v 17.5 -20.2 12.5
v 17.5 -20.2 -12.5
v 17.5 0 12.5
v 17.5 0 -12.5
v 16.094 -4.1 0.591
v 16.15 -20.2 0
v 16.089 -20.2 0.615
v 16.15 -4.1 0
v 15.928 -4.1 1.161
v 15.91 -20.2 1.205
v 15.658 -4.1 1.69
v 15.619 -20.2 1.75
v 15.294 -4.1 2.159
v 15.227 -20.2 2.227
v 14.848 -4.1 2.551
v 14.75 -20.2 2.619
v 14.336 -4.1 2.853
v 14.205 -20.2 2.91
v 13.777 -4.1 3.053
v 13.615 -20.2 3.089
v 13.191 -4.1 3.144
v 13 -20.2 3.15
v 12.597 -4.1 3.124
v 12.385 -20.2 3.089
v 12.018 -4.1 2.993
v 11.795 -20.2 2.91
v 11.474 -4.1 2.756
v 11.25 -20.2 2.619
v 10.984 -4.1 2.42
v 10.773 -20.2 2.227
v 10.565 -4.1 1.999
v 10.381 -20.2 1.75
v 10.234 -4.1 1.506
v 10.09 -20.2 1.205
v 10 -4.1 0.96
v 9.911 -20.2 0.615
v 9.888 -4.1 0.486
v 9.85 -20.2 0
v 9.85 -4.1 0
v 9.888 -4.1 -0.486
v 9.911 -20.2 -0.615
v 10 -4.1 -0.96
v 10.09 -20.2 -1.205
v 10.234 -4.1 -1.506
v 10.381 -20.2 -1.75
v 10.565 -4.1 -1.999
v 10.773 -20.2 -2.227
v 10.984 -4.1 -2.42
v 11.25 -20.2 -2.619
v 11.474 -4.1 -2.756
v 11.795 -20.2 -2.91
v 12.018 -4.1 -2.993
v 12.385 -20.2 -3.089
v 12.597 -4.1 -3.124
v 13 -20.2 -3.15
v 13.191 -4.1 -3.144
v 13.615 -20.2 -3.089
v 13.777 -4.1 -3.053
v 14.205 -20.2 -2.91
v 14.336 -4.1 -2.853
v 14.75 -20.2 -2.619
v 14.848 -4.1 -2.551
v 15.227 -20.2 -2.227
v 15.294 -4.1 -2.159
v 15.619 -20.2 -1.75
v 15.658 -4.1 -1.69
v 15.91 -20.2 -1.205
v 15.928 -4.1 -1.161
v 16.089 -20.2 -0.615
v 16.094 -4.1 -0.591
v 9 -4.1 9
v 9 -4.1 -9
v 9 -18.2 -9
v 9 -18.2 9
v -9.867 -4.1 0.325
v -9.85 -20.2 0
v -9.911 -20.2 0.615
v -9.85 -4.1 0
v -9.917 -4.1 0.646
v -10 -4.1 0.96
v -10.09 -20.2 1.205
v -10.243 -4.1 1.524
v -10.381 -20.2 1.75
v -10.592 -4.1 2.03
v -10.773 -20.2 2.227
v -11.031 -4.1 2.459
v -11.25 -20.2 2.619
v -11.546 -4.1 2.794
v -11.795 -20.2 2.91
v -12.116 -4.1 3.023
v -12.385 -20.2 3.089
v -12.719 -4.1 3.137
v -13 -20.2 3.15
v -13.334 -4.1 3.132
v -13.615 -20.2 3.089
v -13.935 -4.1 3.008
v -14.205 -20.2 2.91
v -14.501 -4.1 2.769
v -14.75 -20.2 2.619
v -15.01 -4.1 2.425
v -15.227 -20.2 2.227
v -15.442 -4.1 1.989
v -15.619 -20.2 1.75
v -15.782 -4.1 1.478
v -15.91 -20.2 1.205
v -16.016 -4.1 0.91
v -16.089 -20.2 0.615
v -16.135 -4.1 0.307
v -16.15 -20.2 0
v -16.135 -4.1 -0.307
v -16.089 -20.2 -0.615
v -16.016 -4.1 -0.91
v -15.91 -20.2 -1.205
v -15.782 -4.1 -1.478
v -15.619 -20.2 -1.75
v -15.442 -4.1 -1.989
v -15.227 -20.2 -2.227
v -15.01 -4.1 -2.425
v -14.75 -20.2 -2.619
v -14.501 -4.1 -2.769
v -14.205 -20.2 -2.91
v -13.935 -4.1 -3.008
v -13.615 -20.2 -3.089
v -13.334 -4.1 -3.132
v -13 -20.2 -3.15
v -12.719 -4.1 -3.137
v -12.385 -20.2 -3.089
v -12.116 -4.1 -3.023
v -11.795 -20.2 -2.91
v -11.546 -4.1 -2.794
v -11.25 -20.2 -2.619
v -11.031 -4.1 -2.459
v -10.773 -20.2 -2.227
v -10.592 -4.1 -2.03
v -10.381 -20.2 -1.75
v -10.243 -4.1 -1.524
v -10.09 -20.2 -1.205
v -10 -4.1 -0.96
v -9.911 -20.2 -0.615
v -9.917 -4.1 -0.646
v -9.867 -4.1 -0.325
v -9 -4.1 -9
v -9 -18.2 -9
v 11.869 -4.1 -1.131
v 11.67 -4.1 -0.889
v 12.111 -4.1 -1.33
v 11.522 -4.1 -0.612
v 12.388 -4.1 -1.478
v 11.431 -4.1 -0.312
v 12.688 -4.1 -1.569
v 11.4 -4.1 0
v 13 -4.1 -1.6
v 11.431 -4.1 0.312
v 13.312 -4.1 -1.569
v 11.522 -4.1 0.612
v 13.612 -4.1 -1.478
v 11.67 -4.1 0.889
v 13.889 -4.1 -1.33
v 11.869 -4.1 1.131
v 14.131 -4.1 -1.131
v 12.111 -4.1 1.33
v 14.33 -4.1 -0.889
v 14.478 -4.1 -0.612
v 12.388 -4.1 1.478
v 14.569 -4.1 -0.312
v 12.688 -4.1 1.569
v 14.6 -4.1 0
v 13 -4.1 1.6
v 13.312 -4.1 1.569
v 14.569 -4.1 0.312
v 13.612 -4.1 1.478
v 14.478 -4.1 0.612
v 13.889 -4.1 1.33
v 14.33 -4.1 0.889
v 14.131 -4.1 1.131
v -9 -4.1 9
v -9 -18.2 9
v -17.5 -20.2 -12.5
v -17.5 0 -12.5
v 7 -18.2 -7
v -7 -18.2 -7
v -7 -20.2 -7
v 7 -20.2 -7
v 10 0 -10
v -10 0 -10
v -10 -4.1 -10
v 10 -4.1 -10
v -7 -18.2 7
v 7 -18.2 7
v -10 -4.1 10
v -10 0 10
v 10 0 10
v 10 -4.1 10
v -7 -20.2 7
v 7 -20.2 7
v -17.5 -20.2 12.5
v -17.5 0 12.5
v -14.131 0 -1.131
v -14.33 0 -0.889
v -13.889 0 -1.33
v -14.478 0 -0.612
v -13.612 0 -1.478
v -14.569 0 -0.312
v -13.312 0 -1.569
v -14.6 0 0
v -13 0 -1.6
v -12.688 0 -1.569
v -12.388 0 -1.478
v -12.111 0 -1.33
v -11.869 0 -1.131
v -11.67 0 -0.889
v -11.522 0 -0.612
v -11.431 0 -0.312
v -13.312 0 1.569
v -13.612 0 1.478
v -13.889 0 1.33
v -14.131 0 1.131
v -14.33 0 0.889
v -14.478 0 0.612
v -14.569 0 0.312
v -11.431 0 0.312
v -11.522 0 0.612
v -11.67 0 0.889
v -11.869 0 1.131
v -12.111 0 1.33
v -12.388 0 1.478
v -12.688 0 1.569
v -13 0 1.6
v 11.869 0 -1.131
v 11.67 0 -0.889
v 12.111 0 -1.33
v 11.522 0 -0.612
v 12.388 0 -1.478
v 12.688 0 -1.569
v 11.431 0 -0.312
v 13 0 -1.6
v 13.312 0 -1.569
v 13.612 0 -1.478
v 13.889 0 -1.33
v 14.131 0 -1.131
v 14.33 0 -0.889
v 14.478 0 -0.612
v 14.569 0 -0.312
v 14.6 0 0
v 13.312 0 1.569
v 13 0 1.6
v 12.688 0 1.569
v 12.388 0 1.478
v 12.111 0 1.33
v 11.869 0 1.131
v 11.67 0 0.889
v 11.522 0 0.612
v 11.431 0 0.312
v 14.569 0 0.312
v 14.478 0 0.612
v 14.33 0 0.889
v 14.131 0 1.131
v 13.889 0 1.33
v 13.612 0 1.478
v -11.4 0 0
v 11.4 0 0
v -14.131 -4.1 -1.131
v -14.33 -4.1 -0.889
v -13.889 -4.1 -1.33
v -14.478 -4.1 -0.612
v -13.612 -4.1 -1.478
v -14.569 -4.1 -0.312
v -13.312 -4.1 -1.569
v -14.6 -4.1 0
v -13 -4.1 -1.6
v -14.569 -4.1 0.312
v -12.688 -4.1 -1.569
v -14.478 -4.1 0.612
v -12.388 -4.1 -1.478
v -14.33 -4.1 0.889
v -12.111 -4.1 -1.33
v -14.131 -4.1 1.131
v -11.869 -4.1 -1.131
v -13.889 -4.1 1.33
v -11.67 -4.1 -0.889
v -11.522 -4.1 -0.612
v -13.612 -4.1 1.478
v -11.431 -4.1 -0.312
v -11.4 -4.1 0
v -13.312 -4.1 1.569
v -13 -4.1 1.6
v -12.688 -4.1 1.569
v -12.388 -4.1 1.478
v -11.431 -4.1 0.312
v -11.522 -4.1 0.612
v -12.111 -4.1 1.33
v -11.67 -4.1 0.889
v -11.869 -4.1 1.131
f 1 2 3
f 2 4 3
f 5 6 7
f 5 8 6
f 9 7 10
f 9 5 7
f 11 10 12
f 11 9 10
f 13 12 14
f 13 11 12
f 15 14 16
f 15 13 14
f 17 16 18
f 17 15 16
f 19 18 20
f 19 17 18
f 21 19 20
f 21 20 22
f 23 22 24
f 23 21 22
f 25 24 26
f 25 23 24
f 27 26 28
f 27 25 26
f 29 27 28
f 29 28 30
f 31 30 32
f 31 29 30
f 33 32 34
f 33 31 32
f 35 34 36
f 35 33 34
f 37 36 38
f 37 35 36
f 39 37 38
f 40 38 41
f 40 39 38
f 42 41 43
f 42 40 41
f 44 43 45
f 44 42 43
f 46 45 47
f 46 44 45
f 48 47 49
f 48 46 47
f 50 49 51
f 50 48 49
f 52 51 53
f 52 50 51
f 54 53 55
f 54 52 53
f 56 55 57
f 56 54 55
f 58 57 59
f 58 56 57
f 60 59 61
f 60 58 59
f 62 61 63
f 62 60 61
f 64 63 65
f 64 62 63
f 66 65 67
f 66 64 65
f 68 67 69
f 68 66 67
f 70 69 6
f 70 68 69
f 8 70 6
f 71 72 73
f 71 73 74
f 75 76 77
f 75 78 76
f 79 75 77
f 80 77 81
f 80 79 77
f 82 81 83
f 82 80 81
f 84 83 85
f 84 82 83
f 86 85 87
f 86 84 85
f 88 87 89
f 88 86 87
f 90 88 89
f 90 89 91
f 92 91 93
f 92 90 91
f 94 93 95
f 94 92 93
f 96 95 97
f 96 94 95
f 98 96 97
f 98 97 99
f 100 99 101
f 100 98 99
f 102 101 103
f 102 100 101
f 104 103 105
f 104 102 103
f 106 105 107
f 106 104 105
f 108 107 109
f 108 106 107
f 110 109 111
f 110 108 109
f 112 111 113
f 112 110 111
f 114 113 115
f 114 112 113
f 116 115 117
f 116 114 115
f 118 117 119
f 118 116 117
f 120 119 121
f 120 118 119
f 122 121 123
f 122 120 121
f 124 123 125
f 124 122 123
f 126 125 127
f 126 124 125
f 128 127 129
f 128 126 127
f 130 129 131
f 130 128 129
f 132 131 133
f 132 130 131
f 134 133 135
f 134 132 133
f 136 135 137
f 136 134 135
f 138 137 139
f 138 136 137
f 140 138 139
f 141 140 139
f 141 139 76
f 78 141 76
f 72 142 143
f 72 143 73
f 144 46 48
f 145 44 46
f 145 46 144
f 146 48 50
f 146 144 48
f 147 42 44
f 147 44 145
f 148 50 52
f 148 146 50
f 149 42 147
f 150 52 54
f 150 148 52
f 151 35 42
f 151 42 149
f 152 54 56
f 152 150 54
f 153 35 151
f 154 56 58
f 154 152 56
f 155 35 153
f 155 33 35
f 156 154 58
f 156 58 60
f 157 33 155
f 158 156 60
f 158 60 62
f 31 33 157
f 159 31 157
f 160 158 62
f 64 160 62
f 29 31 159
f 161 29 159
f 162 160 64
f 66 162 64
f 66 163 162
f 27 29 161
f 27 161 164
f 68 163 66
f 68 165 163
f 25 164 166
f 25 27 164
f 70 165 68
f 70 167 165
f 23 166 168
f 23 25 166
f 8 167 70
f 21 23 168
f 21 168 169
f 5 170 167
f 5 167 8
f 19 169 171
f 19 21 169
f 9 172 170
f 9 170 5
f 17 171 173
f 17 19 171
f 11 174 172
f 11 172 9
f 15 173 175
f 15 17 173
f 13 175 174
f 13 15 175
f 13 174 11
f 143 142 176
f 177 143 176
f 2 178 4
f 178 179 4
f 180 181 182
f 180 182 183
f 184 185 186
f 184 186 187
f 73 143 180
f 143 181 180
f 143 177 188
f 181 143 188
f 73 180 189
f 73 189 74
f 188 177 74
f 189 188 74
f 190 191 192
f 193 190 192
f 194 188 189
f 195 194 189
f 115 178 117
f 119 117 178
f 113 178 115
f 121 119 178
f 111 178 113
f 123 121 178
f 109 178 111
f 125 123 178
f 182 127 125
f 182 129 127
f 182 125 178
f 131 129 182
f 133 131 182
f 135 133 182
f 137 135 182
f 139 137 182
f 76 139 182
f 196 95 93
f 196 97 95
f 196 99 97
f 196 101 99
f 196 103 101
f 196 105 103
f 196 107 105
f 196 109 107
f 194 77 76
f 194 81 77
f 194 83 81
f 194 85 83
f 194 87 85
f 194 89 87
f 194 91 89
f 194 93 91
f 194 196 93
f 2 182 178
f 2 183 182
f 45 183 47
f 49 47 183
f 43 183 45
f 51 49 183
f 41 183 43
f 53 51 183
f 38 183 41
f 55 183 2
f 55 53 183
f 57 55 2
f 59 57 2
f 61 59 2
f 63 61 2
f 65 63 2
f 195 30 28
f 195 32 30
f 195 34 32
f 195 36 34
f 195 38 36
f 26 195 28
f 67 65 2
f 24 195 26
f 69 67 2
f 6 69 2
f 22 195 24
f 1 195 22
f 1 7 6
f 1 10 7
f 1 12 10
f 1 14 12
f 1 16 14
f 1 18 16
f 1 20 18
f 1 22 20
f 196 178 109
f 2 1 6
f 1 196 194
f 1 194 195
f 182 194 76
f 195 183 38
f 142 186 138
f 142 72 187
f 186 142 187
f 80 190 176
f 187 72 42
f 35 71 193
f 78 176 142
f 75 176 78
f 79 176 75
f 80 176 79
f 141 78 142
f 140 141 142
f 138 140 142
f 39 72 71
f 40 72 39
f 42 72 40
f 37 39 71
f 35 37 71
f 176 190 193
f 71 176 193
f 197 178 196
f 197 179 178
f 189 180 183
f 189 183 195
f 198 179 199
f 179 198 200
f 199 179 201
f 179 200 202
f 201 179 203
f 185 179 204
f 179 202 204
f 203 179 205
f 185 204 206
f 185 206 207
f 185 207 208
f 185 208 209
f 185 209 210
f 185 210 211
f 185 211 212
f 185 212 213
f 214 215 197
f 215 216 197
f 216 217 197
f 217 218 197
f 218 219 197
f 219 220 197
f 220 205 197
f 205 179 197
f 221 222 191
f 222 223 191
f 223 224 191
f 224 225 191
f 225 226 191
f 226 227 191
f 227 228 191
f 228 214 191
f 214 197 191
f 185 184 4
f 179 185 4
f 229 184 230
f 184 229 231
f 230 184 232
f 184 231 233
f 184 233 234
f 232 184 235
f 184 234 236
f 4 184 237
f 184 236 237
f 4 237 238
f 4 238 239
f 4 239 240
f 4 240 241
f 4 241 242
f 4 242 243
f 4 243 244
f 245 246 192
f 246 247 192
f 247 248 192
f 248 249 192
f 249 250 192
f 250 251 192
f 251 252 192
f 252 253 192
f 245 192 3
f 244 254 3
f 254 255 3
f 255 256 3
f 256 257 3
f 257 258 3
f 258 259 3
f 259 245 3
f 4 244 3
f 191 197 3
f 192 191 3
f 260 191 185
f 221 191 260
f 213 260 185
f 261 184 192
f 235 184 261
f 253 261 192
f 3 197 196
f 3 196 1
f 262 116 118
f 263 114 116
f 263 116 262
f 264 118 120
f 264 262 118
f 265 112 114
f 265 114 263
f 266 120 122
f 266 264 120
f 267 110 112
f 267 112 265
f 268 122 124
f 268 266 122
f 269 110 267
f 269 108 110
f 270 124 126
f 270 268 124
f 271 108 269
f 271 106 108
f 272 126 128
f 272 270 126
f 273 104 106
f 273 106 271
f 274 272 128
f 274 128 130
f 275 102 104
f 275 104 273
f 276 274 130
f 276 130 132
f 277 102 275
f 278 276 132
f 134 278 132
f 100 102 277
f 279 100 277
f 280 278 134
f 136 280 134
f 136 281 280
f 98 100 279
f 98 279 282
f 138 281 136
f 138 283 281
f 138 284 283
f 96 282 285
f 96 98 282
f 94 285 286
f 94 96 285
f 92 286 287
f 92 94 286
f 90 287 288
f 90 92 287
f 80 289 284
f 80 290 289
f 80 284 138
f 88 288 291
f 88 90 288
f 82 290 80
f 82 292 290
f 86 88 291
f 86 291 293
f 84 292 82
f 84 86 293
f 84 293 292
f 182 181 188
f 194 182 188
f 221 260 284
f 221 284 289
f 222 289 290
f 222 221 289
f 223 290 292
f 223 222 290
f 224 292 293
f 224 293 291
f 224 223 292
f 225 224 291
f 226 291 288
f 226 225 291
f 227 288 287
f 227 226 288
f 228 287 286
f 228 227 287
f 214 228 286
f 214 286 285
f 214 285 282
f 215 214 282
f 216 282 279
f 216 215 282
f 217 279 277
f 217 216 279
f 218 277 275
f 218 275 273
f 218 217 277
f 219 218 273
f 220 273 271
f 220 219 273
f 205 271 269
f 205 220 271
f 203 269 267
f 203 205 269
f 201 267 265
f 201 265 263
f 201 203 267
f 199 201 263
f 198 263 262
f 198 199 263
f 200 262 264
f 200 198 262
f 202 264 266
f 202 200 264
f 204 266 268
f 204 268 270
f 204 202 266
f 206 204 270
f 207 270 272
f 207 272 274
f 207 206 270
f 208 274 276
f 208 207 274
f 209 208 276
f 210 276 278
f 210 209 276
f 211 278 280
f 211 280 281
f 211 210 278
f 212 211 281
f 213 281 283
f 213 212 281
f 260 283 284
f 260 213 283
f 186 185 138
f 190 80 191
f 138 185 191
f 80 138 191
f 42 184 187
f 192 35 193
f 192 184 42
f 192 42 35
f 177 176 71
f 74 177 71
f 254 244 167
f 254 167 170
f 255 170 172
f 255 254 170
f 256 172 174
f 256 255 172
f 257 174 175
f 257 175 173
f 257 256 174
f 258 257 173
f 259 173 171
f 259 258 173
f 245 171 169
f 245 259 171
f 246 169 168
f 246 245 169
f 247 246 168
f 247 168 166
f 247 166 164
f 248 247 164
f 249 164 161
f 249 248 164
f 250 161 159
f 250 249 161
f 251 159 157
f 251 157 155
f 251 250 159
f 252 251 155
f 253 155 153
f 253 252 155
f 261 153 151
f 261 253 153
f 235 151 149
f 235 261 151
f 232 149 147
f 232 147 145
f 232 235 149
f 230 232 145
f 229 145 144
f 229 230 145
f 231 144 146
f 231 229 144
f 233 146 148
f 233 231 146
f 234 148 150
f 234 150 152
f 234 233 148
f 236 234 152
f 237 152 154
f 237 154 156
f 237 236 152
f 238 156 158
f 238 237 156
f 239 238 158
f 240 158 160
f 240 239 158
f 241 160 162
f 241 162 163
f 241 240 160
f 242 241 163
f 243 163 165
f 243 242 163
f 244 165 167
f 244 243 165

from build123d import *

# Parameters (mm, degrees)
F0_W     = 35
F0_H     = 25
F0_R     = 1.6
F0_W_2   = 20
F0_H_2   = 20
F1_DEPTH = 4.1
F2_W     = 35
F2_H     = 25
F2_R     = 3.15
F2_W_2   = 18
F2_H_2   = 18
F3_DEPTH = 14.1
F4_W     = 35
F4_H     = 25
F4_R     = 3.15
F4_W_2   = 14
F4_H_2   = 14
F5_DEPTH = 2
F6_W     = 18
F6_H     = 18
F7_DEPTH = 5


with BuildPart() as f1:
    # F0 (on Front) → F1 (new body)
    with BuildSketch(Plane.XZ):
        Rectangle(F0_W, F0_H)
        with Locations((-13, 0)):
            Circle(F0_R, mode=Mode.SUBTRACT)
        Rectangle(F0_W_2, F0_H_2, mode=Mode.SUBTRACT)
        with Locations((13, 0)):
            Circle(F0_R, mode=Mode.SUBTRACT)
    extrude(amount=F1_DEPTH)

    # F2 (on face) → F3 (join)
    with BuildSketch(Plane.XZ.offset(4.1)):
        Rectangle(F2_W, F2_H)
        with Locations((-13, 0)):
            Circle(F2_R, mode=Mode.SUBTRACT)
        Rectangle(F2_W_2, F2_H_2, mode=Mode.SUBTRACT)
        with Locations((13, 0)):
            Circle(F2_R, mode=Mode.SUBTRACT)
    extrude(amount=F3_DEPTH)

    # F4 (on face) → F5 (join)
    with BuildSketch(Plane.XZ.offset(18.2)):
        Rectangle(F4_W, F4_H)
        with Locations((-13, 0)):
            Circle(F4_R, mode=Mode.SUBTRACT)
        Rectangle(F4_W_2, F4_H_2, mode=Mode.SUBTRACT)
        with Locations((13, 0)):
            Circle(F4_R, mode=Mode.SUBTRACT)
    extrude(amount=F5_DEPTH)

    # F6 (on face) → F7 (cut)
    with BuildSketch(Plane(origin=(0, -4.1, 0), x_dir=(-1, 0, 0), z_dir=(0, 1, 0))):
        Rectangle(F6_W, F6_H)
    extrude(amount=-F7_DEPTH, mode=Mode.SUBTRACT)


solid = f1.part
